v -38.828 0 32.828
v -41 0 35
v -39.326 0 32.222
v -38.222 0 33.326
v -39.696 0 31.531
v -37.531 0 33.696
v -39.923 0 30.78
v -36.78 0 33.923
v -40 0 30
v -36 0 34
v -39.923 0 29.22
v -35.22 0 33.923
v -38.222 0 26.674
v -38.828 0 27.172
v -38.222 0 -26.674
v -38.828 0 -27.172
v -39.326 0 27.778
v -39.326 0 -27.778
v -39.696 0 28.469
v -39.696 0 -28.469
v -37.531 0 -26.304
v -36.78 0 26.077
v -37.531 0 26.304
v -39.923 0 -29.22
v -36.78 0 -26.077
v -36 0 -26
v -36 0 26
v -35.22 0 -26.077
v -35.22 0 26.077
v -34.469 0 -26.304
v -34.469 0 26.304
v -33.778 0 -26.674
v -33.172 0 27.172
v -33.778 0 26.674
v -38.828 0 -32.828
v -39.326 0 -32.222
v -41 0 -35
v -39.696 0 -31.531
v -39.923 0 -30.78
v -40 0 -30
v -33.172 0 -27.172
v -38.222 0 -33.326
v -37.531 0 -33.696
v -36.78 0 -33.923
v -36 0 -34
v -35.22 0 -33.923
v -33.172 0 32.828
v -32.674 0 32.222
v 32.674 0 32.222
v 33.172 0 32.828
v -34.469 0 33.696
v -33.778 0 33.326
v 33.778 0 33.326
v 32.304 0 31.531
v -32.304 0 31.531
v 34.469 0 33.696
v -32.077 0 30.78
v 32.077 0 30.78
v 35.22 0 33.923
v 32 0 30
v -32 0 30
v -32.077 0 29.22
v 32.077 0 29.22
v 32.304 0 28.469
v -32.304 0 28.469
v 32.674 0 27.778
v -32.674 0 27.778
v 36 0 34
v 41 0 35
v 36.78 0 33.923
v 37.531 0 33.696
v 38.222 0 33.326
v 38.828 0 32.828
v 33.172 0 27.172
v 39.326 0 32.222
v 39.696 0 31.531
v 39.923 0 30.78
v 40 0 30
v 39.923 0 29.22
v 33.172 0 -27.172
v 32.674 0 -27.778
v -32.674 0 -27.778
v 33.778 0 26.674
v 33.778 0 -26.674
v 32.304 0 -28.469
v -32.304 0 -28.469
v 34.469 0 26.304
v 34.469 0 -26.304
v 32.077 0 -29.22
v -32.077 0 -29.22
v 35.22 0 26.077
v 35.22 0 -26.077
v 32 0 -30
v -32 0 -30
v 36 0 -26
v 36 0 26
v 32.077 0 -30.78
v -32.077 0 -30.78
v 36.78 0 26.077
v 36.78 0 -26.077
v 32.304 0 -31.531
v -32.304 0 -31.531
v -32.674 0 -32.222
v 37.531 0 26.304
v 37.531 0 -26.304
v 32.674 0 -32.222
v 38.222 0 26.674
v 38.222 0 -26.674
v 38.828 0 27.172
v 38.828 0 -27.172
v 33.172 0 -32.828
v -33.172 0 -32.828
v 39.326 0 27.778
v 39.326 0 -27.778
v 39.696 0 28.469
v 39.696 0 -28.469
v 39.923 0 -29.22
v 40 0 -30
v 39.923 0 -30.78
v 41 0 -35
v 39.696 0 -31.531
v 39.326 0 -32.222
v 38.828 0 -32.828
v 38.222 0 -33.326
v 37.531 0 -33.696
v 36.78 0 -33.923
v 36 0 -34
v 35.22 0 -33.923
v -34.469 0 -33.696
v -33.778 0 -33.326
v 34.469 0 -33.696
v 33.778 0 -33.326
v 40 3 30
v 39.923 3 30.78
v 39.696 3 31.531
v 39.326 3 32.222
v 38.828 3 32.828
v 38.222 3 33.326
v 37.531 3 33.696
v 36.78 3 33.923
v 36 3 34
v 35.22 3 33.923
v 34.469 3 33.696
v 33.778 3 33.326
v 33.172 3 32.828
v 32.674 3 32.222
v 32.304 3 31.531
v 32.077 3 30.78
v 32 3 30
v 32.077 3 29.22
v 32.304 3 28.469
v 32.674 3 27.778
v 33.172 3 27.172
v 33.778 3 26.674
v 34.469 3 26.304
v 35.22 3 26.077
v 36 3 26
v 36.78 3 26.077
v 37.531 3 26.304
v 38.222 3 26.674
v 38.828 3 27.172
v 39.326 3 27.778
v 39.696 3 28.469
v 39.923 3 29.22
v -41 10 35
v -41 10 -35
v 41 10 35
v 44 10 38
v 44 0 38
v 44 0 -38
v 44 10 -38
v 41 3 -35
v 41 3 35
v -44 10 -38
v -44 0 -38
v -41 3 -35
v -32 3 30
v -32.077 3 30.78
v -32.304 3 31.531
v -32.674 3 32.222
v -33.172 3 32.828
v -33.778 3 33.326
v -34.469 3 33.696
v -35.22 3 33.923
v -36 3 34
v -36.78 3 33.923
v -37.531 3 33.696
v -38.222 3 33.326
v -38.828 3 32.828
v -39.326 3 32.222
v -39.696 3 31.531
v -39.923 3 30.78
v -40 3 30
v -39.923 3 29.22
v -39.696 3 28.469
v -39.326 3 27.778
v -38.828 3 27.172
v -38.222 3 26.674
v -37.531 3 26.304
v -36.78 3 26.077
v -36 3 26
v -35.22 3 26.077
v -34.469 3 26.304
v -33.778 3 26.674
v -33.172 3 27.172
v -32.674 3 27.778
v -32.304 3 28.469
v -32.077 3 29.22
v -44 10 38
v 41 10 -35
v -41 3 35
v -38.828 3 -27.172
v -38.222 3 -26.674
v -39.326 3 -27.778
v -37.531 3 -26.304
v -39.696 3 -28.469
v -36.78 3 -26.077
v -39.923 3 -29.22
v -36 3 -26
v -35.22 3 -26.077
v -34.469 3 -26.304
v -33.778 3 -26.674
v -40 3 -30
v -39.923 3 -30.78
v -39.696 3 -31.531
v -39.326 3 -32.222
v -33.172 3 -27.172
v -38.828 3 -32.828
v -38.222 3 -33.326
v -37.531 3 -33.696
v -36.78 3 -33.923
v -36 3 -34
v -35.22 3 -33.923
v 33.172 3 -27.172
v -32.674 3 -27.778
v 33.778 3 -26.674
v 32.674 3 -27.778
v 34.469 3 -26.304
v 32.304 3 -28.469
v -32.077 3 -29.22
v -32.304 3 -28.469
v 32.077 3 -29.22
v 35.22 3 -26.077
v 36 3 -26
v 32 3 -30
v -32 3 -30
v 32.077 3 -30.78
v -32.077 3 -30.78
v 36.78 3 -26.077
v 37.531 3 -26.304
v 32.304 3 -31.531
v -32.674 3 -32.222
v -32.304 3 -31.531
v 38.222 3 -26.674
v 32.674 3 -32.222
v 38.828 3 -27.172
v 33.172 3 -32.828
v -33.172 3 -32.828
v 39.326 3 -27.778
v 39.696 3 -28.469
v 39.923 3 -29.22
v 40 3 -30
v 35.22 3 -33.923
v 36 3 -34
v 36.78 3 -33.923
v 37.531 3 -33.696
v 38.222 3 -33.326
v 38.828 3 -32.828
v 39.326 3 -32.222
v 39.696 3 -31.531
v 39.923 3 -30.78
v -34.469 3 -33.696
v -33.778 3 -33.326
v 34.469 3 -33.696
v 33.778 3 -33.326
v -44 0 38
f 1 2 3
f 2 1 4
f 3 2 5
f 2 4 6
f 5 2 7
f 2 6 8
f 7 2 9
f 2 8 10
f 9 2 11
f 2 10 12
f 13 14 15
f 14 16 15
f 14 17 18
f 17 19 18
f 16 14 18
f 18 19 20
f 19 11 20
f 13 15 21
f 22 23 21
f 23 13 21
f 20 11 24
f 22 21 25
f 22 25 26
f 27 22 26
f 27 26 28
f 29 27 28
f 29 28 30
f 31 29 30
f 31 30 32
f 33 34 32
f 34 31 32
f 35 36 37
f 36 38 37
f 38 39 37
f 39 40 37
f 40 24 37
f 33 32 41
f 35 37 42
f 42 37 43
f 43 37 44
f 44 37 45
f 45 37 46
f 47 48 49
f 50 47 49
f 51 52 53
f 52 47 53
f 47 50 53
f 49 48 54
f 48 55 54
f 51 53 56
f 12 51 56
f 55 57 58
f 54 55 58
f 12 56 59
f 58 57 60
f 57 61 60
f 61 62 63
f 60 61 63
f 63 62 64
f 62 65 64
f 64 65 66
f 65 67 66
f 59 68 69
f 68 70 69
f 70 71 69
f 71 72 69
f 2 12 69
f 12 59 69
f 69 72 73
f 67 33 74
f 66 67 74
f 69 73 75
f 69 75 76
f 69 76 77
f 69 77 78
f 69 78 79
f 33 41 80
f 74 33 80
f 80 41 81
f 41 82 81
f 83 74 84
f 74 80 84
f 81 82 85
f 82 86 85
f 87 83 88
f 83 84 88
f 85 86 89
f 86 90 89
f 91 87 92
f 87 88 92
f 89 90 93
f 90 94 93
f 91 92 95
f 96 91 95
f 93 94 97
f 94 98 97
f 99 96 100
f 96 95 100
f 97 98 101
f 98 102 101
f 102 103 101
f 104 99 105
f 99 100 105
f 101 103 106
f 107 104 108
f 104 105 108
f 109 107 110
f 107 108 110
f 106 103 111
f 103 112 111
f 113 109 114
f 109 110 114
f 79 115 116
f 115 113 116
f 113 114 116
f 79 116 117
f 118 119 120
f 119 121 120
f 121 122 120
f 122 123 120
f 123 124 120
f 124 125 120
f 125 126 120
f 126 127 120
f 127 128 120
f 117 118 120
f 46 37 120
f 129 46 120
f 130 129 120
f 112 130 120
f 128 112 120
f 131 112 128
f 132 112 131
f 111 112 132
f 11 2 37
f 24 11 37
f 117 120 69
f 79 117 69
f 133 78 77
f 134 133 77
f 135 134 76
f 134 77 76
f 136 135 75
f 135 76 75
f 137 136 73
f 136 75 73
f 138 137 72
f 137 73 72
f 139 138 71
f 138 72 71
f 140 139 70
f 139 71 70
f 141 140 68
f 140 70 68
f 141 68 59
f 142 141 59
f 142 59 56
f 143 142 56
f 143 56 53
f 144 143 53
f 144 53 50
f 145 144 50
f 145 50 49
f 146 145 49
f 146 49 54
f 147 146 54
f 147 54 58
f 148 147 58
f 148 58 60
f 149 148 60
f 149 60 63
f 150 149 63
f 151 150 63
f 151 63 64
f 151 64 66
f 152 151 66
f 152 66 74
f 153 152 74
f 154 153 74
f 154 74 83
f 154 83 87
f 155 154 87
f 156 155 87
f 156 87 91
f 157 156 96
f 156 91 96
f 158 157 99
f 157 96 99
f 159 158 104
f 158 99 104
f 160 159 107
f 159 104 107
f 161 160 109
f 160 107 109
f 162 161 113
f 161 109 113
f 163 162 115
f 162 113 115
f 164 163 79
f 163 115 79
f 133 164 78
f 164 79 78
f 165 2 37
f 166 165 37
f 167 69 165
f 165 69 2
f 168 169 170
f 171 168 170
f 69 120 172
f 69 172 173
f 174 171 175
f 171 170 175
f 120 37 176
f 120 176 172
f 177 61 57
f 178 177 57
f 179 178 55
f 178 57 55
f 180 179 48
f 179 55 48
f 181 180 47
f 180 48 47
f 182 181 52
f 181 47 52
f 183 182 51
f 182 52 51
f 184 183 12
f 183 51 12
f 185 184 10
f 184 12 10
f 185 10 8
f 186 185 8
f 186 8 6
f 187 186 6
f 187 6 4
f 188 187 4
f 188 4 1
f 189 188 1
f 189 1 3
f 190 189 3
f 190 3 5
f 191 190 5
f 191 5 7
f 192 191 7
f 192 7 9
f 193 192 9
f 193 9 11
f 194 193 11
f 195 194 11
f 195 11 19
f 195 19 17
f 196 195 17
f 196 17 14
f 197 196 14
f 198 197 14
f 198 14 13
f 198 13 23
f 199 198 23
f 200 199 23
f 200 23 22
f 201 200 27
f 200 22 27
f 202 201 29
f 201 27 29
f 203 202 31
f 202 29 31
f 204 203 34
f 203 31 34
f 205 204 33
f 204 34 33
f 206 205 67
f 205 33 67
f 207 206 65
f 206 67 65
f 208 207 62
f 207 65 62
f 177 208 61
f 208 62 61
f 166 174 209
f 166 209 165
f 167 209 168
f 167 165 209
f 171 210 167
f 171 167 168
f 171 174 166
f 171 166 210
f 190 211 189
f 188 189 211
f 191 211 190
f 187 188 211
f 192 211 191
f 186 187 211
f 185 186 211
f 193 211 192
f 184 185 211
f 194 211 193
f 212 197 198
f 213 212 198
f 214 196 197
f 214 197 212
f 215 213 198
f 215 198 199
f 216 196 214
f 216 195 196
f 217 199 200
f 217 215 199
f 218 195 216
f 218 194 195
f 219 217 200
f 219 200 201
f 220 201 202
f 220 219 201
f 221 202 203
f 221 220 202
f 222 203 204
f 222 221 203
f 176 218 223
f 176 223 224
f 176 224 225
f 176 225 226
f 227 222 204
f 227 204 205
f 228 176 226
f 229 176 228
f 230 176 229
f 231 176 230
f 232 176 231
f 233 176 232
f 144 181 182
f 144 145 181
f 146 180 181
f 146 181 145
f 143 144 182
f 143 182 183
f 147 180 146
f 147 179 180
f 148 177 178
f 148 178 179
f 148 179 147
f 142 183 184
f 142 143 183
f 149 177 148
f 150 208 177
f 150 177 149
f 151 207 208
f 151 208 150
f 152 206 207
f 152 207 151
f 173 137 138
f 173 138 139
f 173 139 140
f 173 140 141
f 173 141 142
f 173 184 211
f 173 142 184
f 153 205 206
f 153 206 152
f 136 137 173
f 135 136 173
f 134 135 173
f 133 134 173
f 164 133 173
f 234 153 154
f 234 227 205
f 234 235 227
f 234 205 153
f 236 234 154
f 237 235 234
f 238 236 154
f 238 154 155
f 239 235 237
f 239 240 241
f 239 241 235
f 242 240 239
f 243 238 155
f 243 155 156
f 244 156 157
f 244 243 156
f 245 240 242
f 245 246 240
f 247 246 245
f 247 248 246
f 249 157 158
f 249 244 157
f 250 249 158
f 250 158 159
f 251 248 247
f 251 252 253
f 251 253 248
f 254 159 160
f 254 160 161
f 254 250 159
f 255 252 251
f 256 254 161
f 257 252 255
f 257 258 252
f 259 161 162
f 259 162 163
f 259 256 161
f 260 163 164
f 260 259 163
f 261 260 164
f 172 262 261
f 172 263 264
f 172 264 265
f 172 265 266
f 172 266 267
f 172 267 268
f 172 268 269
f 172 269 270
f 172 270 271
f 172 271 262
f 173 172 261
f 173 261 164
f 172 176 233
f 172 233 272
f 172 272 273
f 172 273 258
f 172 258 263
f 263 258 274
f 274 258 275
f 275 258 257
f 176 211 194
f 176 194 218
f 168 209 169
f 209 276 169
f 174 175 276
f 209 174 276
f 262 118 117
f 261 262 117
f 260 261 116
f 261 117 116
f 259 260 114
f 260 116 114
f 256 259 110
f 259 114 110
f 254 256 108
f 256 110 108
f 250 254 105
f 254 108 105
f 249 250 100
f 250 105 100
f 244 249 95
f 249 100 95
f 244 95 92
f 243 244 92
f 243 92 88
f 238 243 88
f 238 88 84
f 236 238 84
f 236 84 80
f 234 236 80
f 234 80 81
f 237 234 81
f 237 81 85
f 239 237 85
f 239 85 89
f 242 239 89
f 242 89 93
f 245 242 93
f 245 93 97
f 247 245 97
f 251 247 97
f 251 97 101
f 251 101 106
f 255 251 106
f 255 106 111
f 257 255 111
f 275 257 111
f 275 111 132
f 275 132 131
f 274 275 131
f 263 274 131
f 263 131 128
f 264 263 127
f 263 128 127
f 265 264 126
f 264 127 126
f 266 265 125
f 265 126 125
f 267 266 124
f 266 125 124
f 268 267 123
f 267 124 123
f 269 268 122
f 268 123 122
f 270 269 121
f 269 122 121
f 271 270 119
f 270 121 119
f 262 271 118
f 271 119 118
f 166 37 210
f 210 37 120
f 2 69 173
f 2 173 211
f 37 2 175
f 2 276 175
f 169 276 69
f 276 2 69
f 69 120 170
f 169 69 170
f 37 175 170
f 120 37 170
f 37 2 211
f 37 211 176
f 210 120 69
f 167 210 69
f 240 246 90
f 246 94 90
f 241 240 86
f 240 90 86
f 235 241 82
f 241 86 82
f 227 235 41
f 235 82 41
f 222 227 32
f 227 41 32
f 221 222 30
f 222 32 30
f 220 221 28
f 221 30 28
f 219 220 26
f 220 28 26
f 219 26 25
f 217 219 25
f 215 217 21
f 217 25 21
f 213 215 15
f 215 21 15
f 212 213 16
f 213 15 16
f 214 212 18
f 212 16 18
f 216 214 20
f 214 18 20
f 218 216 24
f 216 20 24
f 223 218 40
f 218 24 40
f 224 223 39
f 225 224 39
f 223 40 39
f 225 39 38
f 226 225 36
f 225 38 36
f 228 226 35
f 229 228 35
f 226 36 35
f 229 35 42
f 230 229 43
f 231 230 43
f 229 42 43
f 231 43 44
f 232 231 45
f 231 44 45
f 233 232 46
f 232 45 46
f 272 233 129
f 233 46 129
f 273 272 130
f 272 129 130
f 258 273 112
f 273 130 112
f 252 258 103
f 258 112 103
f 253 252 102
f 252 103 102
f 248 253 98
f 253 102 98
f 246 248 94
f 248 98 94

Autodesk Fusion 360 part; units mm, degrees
sketch "Sketch1" plane through (0, 0, 0) normal (0, 1, 0) x (1, 0, 0)
  line L0 (-41, -35) -> (-41, 35)
  line L1 (41, -35) -> (-41, 35) construction
  line L2 (36, -30) -> (-36, -30)
  circle A0 centre (36, -30) radius 4
  circle A1 centre (-36, -30) radius 4
  line L3 (41, -35) -> (-41, -35)
  circle A2 centre (-36, 30) radius 4
  line L4 (-41, -35) -> (41, 35) construction
  line L5 (36, -30) -> (-36, 30) construction
  circle A3 centre (36, 30) radius 4
  line L6 (-36, -30) -> (36, 30) construction
  line L7 (36, 30) -> (36, -30)
  line L8 (-41, 35) -> (41, 35)
  line L9 (41, 35) -> (41, -35)
  line L10 (-36, 30) -> (36, 30)
  line L11 (-36, -30) -> (-36, 30)
  line L12 (44, 38) -> (-44, 38)
  line L13 (-44, 38) -> (-44, -38)
  line L14 (-44, -38) -> (44, -38)
  line L15 (44, -38) -> (44, 38)
  line L16 (44, 38) -> (-44, -38) construction
  line L17 (-44, 38) -> (44, -38) construction
  dimension "d1" = 82
  dimension "d2" = 70
  dimension "d3" = 60
  dimension "d4" = 72
  dimension "d5" = 8
  dimension "d6" = 8
  dimension "d7" = 8
  dimension "d8" = 8
  dimension "d9" = 88
  dimension "d10" = 76
extrude "Extrude1" add sketch "Sketch1" along normal blind 3 contours L0 L3 L8 L9 makes body 1
extrude "Extrude2" add sketch "Sketch1" along normal blind 10 separate body contours L12 L13 L14 L15 makes body 2
extrude "Extrude3" add sketch "Sketch1" along normal blind 3 contours L2 A1 L11 | L2 A0 A1 A2 A3 L7 L10 L11 | L2 A1 L11 | L2 A0 L7 | L2 A0 L7 | A2 L10 L11 | A2 L10 L11 | A3 L7 L10 | A3 L7 L10 bodies 1
extrude "Extrude4" cut sketch "Sketch1" along normal blind 10 contours L2 A1 L11 | L2 A1 L11 | L2 A0 L7 | L2 A0 L7 | A2 L10 L11 | A2 L10 L11 | A3 L7 L10 | A3 L7 L10 bodies 1
